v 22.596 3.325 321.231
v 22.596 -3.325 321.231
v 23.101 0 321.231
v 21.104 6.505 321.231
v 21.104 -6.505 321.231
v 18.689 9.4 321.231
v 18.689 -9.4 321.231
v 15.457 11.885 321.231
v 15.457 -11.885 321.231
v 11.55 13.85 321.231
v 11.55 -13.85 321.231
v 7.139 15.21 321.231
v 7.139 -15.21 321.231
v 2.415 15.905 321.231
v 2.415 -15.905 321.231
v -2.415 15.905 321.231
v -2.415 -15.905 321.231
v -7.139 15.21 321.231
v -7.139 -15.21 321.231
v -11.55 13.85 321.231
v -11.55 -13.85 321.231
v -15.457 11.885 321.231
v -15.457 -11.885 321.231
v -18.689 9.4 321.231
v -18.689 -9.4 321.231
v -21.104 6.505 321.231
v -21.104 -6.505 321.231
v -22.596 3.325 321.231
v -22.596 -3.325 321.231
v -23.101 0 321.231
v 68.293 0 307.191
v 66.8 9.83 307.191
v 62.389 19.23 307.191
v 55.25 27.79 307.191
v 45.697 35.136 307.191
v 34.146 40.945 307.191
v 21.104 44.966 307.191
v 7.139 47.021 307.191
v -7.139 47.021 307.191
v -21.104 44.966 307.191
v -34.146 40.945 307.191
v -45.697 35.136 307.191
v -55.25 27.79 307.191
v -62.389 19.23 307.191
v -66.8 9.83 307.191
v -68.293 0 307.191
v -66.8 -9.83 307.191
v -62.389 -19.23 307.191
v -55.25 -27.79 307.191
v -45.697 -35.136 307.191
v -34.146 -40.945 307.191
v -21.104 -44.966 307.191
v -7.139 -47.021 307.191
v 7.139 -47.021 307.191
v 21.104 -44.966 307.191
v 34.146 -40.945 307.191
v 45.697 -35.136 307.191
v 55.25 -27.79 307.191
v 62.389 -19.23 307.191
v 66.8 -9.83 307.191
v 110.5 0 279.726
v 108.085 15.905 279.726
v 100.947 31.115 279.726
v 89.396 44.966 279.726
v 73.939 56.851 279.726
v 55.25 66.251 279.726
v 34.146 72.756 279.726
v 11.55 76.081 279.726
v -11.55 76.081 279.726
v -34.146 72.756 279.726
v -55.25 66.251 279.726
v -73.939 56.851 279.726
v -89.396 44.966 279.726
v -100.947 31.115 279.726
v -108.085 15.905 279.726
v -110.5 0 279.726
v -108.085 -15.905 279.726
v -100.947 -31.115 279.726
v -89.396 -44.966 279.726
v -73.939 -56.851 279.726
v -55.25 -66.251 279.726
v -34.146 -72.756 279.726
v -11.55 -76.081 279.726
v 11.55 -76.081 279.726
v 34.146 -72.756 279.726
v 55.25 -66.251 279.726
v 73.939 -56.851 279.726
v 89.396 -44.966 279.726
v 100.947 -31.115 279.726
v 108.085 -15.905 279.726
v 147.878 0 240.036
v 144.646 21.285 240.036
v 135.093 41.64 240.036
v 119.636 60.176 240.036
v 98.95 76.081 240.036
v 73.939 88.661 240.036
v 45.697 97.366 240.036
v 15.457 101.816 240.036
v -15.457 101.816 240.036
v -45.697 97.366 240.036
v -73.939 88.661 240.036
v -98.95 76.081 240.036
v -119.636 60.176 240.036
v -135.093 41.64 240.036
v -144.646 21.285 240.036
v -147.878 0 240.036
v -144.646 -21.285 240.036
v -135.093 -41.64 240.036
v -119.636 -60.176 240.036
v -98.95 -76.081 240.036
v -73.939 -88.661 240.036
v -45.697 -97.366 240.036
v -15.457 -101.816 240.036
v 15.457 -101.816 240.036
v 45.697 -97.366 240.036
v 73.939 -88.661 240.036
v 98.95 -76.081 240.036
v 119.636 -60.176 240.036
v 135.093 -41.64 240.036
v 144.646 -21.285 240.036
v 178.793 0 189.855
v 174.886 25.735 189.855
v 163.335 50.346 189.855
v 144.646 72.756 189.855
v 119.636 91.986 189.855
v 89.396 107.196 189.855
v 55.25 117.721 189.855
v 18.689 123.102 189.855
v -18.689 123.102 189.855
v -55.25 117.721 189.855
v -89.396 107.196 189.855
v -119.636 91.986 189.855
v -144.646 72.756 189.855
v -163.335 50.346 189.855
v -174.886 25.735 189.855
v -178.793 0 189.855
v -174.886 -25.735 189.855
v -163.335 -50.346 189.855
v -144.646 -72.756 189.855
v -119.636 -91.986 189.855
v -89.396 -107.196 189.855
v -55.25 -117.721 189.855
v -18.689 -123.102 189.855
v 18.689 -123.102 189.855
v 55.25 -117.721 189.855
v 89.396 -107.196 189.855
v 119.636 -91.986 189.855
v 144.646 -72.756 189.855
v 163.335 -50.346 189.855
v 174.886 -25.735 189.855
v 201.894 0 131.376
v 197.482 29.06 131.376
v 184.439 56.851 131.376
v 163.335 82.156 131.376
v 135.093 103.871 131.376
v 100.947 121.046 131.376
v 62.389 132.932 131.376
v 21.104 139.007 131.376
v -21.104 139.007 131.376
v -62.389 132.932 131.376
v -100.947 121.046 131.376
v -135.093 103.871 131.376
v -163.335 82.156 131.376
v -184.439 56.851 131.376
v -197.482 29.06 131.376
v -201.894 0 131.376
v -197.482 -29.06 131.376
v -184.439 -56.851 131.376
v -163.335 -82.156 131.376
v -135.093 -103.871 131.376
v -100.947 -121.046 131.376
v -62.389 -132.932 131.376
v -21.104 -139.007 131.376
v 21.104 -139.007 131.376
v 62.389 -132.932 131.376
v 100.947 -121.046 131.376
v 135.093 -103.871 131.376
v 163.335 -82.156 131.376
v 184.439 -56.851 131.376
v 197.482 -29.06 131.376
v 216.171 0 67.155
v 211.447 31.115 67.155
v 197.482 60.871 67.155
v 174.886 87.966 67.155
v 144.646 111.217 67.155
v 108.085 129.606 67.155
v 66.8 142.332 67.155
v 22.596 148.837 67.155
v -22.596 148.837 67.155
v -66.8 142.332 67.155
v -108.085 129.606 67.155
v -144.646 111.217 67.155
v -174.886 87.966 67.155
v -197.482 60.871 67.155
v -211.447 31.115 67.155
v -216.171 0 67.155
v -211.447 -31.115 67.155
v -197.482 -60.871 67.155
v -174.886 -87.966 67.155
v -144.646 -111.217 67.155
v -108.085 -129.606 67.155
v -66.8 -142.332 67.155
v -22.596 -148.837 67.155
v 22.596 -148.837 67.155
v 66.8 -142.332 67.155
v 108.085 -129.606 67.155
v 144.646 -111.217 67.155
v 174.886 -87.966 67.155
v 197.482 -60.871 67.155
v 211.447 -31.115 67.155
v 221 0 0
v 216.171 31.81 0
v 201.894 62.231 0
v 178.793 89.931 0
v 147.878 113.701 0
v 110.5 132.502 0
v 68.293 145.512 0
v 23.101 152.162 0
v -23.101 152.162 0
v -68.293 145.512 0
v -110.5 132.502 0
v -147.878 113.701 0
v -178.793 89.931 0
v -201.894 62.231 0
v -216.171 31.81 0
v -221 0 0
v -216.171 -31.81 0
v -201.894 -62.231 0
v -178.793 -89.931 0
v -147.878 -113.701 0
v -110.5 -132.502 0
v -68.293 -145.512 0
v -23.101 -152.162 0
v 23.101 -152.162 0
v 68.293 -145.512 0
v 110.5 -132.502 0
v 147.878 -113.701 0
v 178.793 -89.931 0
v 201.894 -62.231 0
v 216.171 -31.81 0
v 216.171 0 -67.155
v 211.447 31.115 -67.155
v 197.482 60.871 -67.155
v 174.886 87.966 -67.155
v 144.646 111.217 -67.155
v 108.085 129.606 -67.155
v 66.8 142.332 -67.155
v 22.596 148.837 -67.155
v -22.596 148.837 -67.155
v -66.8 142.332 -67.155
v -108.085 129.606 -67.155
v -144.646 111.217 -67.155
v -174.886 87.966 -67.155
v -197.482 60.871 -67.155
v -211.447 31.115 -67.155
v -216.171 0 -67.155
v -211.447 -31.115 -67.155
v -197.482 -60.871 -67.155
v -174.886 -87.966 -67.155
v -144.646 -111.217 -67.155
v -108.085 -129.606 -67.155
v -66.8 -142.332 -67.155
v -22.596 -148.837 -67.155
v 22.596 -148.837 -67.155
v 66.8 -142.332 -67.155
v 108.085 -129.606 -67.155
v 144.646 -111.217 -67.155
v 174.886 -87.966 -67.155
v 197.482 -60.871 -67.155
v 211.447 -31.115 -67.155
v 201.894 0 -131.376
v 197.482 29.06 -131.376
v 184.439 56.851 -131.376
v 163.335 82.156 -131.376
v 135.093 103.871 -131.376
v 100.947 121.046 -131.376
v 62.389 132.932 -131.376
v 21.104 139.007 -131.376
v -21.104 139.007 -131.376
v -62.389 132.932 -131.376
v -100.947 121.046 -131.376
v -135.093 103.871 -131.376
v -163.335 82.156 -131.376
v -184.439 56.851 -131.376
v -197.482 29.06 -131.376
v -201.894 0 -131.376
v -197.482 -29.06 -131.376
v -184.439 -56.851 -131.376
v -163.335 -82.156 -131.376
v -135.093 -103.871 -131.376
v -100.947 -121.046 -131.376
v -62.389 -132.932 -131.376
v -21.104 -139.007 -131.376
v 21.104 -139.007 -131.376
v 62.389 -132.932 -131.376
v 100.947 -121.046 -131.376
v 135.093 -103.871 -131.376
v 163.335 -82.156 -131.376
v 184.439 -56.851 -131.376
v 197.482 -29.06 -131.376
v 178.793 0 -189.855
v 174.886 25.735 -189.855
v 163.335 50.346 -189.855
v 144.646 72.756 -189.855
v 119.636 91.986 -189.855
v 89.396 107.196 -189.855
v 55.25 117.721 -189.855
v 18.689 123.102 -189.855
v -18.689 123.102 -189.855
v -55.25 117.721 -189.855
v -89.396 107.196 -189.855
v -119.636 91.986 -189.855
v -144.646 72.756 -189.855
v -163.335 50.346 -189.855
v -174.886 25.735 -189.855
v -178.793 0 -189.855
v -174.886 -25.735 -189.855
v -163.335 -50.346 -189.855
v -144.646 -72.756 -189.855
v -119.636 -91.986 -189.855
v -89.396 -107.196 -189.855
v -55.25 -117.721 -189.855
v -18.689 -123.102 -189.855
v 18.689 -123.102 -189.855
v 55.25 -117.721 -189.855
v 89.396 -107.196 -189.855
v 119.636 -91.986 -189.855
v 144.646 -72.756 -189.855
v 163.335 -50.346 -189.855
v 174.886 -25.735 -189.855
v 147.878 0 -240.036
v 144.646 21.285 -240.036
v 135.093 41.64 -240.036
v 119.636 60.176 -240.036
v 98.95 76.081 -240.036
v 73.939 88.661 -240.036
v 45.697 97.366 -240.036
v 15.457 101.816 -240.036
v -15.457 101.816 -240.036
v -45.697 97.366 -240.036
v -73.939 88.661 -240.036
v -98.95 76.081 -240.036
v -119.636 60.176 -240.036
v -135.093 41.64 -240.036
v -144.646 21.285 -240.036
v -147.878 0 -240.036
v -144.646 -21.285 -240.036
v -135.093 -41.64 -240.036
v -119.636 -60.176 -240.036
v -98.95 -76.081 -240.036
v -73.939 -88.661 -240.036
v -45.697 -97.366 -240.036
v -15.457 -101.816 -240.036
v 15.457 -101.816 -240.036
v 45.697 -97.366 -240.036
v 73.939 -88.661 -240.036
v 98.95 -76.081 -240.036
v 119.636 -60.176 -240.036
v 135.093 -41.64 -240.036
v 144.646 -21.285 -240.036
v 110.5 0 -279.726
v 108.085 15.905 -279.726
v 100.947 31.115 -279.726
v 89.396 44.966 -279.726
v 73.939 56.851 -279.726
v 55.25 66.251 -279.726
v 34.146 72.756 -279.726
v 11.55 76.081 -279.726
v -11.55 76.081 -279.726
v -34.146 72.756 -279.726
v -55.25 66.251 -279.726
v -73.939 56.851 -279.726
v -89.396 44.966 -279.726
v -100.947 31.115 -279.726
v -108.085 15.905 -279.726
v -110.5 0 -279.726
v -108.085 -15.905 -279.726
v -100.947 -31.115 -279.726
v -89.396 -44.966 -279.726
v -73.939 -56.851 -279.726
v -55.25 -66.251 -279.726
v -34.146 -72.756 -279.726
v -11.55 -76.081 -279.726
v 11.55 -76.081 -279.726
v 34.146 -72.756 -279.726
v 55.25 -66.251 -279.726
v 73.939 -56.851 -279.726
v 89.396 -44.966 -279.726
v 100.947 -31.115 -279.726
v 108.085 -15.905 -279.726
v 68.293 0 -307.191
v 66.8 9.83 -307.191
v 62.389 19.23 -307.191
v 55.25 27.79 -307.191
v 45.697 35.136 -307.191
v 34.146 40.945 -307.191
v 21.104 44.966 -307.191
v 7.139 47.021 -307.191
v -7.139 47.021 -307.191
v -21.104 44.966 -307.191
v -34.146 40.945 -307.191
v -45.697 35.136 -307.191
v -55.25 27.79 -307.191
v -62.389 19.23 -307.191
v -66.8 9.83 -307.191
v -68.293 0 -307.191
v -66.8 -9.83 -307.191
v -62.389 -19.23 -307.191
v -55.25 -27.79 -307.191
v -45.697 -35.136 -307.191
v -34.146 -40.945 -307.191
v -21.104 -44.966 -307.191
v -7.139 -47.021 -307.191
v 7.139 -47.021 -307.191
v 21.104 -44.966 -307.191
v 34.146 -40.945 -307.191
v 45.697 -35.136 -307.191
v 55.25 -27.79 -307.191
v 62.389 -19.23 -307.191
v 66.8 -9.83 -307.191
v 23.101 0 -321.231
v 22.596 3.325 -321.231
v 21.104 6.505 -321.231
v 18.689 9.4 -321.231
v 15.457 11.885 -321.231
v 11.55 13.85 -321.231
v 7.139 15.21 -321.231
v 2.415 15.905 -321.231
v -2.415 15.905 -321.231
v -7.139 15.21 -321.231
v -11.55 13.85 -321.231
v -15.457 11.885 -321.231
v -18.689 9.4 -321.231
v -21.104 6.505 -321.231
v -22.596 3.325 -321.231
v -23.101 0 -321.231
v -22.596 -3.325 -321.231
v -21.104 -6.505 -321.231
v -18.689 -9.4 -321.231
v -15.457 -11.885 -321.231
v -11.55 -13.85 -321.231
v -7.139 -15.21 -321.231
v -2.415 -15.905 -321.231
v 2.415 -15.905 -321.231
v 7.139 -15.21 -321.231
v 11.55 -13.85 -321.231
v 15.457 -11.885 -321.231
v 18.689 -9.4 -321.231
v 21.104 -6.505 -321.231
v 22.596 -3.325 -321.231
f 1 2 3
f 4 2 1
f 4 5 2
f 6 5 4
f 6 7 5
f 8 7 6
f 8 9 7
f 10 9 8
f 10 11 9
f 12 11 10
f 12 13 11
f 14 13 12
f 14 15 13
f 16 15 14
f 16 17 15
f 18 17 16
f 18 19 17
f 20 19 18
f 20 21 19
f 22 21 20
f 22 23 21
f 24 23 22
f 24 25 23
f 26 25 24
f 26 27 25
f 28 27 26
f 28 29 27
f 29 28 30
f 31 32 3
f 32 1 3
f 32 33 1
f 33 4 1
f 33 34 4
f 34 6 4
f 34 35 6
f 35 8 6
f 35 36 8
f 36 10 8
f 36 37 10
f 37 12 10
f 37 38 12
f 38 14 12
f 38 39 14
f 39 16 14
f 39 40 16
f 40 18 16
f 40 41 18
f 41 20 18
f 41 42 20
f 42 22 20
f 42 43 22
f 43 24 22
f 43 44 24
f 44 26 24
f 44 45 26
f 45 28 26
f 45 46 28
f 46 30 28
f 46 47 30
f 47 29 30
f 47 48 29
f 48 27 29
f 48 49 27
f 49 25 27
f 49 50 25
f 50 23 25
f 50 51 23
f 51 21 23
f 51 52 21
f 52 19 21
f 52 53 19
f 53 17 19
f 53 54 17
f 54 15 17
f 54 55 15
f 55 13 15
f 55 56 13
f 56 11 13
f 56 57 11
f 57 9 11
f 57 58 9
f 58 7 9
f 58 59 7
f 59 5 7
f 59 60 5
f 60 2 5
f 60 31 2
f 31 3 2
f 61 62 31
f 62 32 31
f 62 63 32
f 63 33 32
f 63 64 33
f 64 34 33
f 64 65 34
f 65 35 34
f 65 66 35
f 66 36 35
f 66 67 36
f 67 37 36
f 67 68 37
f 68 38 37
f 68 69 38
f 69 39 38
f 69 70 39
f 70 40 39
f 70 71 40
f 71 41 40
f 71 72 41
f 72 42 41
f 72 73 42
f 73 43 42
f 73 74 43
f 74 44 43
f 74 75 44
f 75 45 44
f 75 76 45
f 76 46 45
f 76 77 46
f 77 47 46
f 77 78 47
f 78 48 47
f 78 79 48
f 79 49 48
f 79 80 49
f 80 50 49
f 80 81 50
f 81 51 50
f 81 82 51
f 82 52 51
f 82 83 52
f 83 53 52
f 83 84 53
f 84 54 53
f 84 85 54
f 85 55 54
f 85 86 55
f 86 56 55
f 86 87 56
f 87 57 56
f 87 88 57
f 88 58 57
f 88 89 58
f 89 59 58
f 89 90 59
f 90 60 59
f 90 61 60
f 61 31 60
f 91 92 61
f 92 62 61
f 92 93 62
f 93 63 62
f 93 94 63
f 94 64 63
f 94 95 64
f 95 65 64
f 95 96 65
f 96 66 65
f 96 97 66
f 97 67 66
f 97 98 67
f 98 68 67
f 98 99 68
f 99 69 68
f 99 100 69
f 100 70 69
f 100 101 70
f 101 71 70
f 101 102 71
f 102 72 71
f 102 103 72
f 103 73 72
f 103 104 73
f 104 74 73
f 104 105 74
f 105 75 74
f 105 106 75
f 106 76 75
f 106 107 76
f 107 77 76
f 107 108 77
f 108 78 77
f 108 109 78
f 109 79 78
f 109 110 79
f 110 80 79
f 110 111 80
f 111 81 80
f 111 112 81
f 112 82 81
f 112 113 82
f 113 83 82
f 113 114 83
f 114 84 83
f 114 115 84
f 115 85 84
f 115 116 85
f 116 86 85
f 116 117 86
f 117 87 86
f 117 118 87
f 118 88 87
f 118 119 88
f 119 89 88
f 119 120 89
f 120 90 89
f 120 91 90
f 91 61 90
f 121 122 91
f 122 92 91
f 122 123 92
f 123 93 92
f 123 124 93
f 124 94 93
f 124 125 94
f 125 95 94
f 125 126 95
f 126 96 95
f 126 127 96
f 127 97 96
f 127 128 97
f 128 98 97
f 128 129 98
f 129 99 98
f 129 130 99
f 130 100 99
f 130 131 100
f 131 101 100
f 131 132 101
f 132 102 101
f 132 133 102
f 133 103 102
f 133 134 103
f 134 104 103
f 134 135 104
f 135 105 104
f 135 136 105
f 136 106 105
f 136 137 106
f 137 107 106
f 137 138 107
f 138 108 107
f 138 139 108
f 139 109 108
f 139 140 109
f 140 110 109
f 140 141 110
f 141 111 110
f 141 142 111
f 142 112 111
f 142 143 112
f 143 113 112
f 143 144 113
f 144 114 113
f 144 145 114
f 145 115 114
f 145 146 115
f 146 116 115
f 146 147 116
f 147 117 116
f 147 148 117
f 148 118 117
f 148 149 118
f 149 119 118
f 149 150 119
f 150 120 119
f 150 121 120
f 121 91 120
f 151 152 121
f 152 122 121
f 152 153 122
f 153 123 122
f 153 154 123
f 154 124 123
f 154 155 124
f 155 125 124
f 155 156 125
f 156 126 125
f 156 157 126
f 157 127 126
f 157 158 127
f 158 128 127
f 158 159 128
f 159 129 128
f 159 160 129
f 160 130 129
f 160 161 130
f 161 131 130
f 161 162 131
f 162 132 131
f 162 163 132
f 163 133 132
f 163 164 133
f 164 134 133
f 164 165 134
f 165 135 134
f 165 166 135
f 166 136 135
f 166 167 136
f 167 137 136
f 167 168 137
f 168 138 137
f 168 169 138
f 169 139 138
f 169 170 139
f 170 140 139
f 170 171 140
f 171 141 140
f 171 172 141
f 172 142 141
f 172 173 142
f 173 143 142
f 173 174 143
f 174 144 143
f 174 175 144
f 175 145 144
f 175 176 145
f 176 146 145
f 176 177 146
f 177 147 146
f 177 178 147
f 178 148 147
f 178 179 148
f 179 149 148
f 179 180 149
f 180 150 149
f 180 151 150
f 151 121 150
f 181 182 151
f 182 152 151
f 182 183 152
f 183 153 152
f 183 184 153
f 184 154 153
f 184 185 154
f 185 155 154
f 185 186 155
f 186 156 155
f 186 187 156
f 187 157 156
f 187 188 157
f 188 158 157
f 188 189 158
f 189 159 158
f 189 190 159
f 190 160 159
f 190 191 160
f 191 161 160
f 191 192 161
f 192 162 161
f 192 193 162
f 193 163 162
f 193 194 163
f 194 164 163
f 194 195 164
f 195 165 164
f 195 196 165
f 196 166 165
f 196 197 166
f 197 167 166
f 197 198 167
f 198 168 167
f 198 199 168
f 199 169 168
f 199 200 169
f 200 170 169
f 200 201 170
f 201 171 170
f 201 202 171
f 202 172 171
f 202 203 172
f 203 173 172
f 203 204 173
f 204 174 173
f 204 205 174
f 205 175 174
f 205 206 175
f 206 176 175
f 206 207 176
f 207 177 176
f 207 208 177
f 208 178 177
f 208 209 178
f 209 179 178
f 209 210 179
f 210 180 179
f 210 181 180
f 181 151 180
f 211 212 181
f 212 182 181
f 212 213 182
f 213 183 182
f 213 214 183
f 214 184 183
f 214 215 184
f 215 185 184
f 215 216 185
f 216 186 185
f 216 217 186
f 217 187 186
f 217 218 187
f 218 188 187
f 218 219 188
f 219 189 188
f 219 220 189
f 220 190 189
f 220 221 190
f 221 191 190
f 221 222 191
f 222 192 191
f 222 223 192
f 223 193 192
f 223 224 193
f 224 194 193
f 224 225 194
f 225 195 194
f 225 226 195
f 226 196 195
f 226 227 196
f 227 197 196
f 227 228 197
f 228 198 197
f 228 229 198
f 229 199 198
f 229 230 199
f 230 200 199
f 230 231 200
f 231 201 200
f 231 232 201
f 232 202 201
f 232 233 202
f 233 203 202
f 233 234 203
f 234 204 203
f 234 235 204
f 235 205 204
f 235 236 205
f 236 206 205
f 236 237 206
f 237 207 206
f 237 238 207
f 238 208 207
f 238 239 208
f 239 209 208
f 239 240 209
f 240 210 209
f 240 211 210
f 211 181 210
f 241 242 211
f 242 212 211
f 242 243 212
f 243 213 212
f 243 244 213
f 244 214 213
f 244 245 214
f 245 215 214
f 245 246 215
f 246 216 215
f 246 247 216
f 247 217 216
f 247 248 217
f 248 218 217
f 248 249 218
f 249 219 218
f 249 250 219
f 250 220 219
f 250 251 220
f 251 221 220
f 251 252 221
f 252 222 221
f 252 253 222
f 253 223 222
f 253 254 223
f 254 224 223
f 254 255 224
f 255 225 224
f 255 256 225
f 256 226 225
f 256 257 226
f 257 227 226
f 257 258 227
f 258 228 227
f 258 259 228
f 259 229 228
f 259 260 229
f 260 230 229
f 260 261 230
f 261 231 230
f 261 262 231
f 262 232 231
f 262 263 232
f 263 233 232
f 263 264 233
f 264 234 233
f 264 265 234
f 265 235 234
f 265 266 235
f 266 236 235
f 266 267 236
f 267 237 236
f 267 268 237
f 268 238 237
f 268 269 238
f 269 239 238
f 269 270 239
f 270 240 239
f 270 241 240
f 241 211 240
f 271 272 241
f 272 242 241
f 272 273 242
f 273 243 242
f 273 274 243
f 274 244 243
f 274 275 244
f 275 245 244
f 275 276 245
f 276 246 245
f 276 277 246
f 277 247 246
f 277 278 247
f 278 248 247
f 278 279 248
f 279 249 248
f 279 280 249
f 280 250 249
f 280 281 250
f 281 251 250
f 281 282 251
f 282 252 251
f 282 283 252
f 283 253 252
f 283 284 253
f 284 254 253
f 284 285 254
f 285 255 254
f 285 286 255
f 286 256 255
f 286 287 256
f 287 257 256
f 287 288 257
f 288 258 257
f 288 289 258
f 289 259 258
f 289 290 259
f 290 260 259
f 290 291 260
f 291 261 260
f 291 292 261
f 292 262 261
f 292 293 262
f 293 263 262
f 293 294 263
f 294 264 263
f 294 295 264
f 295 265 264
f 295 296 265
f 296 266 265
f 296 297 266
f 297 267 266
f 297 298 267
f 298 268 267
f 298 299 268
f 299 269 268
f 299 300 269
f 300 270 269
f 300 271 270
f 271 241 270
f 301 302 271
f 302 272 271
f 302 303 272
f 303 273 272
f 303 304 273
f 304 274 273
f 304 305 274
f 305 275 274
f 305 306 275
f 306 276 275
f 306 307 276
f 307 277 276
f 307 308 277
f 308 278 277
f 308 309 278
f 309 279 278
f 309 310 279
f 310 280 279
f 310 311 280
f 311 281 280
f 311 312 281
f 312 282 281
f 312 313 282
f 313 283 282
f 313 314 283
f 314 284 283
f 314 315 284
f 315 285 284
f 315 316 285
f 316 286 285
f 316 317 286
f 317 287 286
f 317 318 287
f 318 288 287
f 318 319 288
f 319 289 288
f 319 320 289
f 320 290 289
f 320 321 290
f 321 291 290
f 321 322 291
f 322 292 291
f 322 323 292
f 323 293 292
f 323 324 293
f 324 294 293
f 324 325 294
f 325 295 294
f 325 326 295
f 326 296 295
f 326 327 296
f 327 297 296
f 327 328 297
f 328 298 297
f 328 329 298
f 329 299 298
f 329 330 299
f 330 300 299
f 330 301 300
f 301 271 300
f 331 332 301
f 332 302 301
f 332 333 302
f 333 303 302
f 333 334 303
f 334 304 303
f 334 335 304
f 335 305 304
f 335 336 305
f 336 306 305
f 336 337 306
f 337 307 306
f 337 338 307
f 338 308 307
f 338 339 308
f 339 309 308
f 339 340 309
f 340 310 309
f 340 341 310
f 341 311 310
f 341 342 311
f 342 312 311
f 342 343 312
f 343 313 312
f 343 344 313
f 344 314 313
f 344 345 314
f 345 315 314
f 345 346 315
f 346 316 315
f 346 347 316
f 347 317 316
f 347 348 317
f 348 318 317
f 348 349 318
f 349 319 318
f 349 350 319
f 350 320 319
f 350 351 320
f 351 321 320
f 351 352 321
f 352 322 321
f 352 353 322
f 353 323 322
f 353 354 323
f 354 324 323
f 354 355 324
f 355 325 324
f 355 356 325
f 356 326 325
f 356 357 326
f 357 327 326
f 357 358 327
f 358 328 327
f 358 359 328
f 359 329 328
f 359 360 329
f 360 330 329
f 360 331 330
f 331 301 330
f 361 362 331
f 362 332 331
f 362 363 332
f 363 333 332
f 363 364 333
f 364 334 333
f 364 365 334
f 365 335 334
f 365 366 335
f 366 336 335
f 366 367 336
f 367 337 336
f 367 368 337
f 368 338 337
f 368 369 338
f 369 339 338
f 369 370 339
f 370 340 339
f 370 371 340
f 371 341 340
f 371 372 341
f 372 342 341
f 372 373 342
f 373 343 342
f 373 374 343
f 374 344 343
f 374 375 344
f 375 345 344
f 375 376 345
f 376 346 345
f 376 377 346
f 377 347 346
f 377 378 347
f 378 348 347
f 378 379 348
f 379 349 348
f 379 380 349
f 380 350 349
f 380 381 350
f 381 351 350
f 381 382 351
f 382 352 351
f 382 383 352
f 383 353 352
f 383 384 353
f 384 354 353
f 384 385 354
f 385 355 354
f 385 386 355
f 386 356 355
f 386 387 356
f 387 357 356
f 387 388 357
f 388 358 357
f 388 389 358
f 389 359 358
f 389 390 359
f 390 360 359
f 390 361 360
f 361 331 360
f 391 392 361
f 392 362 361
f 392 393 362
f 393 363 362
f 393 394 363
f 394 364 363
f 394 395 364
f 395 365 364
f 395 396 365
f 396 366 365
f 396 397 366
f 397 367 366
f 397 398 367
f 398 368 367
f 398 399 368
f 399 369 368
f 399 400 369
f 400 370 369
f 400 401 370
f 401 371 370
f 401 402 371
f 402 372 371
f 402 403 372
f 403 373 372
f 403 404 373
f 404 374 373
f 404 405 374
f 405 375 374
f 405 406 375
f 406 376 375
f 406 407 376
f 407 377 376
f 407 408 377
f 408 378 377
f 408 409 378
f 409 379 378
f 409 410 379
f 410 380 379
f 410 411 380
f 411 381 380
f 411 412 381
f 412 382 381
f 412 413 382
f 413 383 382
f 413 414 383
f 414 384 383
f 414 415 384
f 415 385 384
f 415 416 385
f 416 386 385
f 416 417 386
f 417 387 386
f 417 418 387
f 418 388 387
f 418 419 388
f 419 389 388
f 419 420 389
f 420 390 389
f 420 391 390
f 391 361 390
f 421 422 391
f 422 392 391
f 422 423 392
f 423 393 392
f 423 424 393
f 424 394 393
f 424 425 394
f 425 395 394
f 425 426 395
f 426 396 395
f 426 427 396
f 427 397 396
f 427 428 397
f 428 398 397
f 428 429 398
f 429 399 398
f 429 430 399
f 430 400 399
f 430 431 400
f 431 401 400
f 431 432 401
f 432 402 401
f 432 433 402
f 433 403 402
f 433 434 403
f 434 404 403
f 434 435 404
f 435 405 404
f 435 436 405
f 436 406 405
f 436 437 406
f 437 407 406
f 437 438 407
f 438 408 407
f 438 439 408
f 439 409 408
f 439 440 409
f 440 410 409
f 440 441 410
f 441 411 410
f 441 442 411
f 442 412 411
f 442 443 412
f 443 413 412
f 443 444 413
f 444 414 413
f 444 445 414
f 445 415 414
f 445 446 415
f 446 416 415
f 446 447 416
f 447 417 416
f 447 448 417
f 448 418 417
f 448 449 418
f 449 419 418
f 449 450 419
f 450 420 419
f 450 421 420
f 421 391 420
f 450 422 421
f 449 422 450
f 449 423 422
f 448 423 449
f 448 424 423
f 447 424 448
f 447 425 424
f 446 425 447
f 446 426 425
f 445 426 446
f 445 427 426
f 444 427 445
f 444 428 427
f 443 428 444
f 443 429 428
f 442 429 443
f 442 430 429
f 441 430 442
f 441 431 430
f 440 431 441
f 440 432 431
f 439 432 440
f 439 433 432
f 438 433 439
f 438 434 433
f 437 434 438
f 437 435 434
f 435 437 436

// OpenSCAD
// Generated by SolidPython 1.0.1 on 2020-07-29 00:46:50


scale(v = [13, 9, 19]) {
	sphere(r = 17);
}
/***********************************************
*********      SolidPython code:      **********
************************************************
 
# import packages: SolidPython
from solid import *
from solid.utils import *
from itertools import chain, combinations, permutations


class Resize:

    def __init__(self, scad_file):
        self.scad_file = scad_file
        #self.scad_file = import_scad(scad_file)
        # cone/cylinder param:
        self.r1 = 0
        self.r2 = 0
        self.h = 0
        # rectangular prism param:
        self.w = 0
        self.l = 0
        # ellipse param:
        self.r = 0

    # import OpenScad code (file name corresponds to shape)


    # classify shape + parameters
    def assign(self, param1, param2, param3):
        if self.scad_file == 'cone.scad':
            self.r1 = param1
            self.r2 = param2
            self.h = param3
        elif self.scad_file == 'cylinder.scad':
            self.r1 = param1
            self.r2 = param2
            self.h = param3
        elif self.scad_file == 'rectangularPrism.scad':
            self.h = param1
            self.l = param2
            self.w = param3
        else:
            self.r = param1
            self.h = param2

    # resize parameters
    def iterate(self):
        x = range(3, 20, 2)
        i = 1
        if self.scad_file == 'cone.scad':
            tempList = list(permutations(x, 2))
            for temp in tempList:
                param1 = temp[0]
                param2 = temp[1]
                filepath = 'produced_scad_files/' + 'cone' + str(param1) + '_' + str(param2) + '_' + '.scad'
                scad_render_to_file(cylinder(h=param1, r1=param2, r2=0), filepath)

        elif self.scad_file == 'cylinder.scad':
            tempList = list(permutations(x, 3))
            for temp in tempList:
                param1 = temp[0]
                param2 = temp[1]
                filepath = 'produced_scad_files/' + 'cylinder' + str(param1) + '_' + str(param2) + '_' + '.scad'
                scad_render_to_file(cylinder(h=param1, r1=param2, r2=param2), filepath)

        elif self.scad_file == 'rectangularPrism.scad':
            tempList = list(permutations(x, 3))
            for temp in tempList:
                param1 = temp[0]
                param2 = temp[1]
                param3 = temp[2]
                filepath = 'produced_scad_files/' + 'rectangularPrism' + str(param1) + '_' + str(param2) + '_' + str(
                    param3) + '.scad'
                scad_render_to_file(cube(size=(param1, param2, param3)), filepath)

        elif self.scad_file == 'ellipse.scad':
            tempList = list(permutations(x, 4))
            for temp in tempList:
                param1 = temp[0]
                param2 = temp[1]
                param3 = temp[2]
                param4 = temp[3]
                filepath = 'produced_scad_files/' + 'ellipse' + str(param1) + '_' + str(param2) + '_' + str(param3) + '_' + str(param4) + '.scad'
                scad_render_to_file(scale([param1, param2, param3])(sphere(r=param4)), filepath)

    def render_to_scadfile(self):
        scad_render_to_file(scad, 'example.scad') 
 
************************************************/
